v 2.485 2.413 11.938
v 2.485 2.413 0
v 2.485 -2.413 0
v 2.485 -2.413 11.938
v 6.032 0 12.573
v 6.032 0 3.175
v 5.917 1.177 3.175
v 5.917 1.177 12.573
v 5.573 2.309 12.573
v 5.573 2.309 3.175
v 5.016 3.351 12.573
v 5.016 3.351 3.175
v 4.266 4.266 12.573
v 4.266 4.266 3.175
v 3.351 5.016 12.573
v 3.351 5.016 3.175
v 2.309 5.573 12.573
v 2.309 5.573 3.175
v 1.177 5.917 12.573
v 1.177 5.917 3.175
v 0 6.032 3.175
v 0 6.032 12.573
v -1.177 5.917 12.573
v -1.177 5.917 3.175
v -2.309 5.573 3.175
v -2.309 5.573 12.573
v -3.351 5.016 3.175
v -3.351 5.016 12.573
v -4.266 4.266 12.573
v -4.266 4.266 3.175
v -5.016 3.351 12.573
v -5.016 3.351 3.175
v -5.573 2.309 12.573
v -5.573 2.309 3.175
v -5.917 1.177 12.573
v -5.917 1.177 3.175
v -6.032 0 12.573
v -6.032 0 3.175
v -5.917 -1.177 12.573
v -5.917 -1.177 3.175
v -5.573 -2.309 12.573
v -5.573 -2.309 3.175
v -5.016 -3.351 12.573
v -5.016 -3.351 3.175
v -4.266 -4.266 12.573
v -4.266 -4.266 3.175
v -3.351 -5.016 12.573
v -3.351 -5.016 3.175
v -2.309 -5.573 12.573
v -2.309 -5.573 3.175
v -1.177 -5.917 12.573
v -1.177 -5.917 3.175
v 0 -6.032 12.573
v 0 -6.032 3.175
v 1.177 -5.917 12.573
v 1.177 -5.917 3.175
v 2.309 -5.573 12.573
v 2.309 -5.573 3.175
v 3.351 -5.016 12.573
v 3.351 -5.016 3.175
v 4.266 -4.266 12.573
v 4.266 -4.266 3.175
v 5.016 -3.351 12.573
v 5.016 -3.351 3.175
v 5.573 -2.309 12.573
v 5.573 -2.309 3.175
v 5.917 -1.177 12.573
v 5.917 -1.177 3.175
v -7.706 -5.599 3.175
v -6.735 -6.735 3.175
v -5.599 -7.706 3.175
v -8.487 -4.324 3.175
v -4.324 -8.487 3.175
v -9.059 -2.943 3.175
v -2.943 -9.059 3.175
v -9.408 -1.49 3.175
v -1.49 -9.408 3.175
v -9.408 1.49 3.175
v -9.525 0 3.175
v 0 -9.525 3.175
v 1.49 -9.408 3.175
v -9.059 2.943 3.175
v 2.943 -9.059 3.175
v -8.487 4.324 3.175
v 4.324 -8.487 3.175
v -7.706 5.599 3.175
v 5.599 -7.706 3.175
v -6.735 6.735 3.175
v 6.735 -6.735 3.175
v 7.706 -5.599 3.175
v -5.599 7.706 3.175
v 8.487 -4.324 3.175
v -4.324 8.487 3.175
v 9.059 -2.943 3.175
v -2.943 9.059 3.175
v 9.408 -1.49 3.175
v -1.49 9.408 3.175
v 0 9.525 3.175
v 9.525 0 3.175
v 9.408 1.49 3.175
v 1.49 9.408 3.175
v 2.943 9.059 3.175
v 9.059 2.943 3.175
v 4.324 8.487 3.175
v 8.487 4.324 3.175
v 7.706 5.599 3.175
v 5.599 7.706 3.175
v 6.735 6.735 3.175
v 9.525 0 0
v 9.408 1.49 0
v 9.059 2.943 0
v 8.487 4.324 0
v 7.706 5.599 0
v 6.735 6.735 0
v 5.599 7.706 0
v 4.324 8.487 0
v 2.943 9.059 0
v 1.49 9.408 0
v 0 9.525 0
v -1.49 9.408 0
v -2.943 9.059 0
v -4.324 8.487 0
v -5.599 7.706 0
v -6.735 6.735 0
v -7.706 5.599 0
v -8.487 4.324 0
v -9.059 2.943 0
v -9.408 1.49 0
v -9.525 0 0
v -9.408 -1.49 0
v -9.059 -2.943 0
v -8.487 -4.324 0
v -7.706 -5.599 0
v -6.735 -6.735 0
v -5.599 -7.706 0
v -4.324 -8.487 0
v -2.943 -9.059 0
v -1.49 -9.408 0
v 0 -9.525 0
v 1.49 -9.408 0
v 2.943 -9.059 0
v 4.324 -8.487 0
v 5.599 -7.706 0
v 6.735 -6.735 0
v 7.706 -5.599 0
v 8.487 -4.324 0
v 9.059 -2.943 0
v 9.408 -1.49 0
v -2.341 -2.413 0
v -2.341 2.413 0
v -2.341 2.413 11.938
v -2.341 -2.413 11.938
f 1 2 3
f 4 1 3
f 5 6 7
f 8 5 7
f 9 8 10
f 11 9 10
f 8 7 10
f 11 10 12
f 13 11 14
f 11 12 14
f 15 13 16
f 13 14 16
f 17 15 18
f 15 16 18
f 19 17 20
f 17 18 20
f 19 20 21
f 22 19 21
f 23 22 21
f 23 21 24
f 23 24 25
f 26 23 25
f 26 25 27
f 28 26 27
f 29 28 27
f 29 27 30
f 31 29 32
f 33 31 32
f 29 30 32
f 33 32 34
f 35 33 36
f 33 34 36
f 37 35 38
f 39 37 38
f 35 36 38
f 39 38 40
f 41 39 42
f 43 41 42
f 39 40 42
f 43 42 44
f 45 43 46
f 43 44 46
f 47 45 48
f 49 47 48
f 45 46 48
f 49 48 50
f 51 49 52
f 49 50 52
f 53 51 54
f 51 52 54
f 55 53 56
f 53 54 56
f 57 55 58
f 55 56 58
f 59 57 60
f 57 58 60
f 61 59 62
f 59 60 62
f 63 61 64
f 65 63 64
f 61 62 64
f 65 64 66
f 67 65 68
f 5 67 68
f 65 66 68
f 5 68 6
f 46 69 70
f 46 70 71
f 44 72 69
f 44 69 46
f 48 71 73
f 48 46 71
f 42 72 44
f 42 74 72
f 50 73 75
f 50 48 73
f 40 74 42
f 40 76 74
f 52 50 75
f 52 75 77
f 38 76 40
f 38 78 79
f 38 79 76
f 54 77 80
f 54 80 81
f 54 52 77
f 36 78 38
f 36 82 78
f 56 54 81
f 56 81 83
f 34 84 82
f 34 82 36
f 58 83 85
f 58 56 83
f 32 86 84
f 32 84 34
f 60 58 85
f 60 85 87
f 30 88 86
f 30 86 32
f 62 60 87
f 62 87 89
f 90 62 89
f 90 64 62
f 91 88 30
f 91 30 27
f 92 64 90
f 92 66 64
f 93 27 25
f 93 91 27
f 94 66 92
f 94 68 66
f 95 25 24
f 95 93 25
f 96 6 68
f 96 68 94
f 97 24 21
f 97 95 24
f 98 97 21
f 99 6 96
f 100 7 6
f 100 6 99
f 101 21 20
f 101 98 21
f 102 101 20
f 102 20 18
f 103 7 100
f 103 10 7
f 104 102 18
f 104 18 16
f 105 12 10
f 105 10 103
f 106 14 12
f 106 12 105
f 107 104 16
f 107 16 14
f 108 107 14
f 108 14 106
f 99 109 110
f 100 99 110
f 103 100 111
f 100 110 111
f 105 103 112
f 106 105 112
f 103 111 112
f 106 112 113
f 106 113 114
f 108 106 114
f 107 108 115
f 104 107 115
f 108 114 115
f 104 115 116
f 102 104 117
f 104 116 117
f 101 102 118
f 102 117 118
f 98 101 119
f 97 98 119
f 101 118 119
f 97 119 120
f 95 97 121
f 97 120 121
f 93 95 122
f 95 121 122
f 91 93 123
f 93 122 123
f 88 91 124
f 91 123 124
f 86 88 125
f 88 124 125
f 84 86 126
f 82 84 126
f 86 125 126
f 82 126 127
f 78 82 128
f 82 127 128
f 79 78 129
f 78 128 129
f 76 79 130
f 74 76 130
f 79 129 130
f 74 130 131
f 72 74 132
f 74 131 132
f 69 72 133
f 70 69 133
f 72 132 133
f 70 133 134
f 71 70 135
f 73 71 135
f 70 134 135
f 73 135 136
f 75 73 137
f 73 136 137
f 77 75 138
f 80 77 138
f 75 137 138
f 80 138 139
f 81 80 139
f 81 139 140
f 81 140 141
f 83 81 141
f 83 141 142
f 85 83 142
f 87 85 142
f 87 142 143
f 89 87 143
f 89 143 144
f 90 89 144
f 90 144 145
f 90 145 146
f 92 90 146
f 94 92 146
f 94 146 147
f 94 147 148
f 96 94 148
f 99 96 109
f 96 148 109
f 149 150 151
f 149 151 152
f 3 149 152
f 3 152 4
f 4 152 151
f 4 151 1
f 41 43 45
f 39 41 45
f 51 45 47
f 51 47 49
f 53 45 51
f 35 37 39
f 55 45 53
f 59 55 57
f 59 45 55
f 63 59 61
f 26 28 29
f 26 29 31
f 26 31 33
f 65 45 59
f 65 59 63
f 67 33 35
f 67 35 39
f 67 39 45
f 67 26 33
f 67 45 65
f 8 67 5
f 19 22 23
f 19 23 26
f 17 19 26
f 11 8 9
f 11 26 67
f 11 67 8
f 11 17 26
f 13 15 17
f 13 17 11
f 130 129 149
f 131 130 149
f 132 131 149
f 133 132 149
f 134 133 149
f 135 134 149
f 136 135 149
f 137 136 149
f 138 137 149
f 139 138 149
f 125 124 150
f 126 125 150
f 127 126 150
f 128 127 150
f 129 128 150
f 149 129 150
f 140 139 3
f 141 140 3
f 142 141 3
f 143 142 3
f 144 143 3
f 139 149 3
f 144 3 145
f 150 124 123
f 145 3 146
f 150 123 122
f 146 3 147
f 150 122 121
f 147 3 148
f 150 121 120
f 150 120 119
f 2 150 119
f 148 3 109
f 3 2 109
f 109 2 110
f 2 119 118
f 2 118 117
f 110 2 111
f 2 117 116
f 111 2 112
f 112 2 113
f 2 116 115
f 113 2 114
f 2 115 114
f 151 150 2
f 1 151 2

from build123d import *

# Parameters (mm, degrees)
F0_R     = 9.525
F1_DEPTH = 3.175
F2_R     = 6.0325
F3_DEPTH = 9.398
F4_W     = 4.826
F4_H     = 4.826
F5_DEPTH = 11.938


with BuildPart() as f1:
    # F0 (on Top) → F1 (new body)
    with BuildSketch(Plane.XY):
        Circle(F0_R)
    extrude(amount=F1_DEPTH)

    # F2 (on face) → F3 (join)
    with BuildSketch(Plane.XY.offset(3.175)):
        Circle(F2_R)
    extrude(amount=F3_DEPTH)

    # F4 (on face) → F5 (cut)
    with BuildSketch(Plane(origin=(0, 0, 0), x_dir=(1, 0, 0), z_dir=(0, 0, -1))):
        with Locations((0.071996, 0)):
            Rectangle(F4_W, F4_H)
    extrude(amount=-F5_DEPTH, mode=Mode.SUBTRACT)


solid = f1.part
